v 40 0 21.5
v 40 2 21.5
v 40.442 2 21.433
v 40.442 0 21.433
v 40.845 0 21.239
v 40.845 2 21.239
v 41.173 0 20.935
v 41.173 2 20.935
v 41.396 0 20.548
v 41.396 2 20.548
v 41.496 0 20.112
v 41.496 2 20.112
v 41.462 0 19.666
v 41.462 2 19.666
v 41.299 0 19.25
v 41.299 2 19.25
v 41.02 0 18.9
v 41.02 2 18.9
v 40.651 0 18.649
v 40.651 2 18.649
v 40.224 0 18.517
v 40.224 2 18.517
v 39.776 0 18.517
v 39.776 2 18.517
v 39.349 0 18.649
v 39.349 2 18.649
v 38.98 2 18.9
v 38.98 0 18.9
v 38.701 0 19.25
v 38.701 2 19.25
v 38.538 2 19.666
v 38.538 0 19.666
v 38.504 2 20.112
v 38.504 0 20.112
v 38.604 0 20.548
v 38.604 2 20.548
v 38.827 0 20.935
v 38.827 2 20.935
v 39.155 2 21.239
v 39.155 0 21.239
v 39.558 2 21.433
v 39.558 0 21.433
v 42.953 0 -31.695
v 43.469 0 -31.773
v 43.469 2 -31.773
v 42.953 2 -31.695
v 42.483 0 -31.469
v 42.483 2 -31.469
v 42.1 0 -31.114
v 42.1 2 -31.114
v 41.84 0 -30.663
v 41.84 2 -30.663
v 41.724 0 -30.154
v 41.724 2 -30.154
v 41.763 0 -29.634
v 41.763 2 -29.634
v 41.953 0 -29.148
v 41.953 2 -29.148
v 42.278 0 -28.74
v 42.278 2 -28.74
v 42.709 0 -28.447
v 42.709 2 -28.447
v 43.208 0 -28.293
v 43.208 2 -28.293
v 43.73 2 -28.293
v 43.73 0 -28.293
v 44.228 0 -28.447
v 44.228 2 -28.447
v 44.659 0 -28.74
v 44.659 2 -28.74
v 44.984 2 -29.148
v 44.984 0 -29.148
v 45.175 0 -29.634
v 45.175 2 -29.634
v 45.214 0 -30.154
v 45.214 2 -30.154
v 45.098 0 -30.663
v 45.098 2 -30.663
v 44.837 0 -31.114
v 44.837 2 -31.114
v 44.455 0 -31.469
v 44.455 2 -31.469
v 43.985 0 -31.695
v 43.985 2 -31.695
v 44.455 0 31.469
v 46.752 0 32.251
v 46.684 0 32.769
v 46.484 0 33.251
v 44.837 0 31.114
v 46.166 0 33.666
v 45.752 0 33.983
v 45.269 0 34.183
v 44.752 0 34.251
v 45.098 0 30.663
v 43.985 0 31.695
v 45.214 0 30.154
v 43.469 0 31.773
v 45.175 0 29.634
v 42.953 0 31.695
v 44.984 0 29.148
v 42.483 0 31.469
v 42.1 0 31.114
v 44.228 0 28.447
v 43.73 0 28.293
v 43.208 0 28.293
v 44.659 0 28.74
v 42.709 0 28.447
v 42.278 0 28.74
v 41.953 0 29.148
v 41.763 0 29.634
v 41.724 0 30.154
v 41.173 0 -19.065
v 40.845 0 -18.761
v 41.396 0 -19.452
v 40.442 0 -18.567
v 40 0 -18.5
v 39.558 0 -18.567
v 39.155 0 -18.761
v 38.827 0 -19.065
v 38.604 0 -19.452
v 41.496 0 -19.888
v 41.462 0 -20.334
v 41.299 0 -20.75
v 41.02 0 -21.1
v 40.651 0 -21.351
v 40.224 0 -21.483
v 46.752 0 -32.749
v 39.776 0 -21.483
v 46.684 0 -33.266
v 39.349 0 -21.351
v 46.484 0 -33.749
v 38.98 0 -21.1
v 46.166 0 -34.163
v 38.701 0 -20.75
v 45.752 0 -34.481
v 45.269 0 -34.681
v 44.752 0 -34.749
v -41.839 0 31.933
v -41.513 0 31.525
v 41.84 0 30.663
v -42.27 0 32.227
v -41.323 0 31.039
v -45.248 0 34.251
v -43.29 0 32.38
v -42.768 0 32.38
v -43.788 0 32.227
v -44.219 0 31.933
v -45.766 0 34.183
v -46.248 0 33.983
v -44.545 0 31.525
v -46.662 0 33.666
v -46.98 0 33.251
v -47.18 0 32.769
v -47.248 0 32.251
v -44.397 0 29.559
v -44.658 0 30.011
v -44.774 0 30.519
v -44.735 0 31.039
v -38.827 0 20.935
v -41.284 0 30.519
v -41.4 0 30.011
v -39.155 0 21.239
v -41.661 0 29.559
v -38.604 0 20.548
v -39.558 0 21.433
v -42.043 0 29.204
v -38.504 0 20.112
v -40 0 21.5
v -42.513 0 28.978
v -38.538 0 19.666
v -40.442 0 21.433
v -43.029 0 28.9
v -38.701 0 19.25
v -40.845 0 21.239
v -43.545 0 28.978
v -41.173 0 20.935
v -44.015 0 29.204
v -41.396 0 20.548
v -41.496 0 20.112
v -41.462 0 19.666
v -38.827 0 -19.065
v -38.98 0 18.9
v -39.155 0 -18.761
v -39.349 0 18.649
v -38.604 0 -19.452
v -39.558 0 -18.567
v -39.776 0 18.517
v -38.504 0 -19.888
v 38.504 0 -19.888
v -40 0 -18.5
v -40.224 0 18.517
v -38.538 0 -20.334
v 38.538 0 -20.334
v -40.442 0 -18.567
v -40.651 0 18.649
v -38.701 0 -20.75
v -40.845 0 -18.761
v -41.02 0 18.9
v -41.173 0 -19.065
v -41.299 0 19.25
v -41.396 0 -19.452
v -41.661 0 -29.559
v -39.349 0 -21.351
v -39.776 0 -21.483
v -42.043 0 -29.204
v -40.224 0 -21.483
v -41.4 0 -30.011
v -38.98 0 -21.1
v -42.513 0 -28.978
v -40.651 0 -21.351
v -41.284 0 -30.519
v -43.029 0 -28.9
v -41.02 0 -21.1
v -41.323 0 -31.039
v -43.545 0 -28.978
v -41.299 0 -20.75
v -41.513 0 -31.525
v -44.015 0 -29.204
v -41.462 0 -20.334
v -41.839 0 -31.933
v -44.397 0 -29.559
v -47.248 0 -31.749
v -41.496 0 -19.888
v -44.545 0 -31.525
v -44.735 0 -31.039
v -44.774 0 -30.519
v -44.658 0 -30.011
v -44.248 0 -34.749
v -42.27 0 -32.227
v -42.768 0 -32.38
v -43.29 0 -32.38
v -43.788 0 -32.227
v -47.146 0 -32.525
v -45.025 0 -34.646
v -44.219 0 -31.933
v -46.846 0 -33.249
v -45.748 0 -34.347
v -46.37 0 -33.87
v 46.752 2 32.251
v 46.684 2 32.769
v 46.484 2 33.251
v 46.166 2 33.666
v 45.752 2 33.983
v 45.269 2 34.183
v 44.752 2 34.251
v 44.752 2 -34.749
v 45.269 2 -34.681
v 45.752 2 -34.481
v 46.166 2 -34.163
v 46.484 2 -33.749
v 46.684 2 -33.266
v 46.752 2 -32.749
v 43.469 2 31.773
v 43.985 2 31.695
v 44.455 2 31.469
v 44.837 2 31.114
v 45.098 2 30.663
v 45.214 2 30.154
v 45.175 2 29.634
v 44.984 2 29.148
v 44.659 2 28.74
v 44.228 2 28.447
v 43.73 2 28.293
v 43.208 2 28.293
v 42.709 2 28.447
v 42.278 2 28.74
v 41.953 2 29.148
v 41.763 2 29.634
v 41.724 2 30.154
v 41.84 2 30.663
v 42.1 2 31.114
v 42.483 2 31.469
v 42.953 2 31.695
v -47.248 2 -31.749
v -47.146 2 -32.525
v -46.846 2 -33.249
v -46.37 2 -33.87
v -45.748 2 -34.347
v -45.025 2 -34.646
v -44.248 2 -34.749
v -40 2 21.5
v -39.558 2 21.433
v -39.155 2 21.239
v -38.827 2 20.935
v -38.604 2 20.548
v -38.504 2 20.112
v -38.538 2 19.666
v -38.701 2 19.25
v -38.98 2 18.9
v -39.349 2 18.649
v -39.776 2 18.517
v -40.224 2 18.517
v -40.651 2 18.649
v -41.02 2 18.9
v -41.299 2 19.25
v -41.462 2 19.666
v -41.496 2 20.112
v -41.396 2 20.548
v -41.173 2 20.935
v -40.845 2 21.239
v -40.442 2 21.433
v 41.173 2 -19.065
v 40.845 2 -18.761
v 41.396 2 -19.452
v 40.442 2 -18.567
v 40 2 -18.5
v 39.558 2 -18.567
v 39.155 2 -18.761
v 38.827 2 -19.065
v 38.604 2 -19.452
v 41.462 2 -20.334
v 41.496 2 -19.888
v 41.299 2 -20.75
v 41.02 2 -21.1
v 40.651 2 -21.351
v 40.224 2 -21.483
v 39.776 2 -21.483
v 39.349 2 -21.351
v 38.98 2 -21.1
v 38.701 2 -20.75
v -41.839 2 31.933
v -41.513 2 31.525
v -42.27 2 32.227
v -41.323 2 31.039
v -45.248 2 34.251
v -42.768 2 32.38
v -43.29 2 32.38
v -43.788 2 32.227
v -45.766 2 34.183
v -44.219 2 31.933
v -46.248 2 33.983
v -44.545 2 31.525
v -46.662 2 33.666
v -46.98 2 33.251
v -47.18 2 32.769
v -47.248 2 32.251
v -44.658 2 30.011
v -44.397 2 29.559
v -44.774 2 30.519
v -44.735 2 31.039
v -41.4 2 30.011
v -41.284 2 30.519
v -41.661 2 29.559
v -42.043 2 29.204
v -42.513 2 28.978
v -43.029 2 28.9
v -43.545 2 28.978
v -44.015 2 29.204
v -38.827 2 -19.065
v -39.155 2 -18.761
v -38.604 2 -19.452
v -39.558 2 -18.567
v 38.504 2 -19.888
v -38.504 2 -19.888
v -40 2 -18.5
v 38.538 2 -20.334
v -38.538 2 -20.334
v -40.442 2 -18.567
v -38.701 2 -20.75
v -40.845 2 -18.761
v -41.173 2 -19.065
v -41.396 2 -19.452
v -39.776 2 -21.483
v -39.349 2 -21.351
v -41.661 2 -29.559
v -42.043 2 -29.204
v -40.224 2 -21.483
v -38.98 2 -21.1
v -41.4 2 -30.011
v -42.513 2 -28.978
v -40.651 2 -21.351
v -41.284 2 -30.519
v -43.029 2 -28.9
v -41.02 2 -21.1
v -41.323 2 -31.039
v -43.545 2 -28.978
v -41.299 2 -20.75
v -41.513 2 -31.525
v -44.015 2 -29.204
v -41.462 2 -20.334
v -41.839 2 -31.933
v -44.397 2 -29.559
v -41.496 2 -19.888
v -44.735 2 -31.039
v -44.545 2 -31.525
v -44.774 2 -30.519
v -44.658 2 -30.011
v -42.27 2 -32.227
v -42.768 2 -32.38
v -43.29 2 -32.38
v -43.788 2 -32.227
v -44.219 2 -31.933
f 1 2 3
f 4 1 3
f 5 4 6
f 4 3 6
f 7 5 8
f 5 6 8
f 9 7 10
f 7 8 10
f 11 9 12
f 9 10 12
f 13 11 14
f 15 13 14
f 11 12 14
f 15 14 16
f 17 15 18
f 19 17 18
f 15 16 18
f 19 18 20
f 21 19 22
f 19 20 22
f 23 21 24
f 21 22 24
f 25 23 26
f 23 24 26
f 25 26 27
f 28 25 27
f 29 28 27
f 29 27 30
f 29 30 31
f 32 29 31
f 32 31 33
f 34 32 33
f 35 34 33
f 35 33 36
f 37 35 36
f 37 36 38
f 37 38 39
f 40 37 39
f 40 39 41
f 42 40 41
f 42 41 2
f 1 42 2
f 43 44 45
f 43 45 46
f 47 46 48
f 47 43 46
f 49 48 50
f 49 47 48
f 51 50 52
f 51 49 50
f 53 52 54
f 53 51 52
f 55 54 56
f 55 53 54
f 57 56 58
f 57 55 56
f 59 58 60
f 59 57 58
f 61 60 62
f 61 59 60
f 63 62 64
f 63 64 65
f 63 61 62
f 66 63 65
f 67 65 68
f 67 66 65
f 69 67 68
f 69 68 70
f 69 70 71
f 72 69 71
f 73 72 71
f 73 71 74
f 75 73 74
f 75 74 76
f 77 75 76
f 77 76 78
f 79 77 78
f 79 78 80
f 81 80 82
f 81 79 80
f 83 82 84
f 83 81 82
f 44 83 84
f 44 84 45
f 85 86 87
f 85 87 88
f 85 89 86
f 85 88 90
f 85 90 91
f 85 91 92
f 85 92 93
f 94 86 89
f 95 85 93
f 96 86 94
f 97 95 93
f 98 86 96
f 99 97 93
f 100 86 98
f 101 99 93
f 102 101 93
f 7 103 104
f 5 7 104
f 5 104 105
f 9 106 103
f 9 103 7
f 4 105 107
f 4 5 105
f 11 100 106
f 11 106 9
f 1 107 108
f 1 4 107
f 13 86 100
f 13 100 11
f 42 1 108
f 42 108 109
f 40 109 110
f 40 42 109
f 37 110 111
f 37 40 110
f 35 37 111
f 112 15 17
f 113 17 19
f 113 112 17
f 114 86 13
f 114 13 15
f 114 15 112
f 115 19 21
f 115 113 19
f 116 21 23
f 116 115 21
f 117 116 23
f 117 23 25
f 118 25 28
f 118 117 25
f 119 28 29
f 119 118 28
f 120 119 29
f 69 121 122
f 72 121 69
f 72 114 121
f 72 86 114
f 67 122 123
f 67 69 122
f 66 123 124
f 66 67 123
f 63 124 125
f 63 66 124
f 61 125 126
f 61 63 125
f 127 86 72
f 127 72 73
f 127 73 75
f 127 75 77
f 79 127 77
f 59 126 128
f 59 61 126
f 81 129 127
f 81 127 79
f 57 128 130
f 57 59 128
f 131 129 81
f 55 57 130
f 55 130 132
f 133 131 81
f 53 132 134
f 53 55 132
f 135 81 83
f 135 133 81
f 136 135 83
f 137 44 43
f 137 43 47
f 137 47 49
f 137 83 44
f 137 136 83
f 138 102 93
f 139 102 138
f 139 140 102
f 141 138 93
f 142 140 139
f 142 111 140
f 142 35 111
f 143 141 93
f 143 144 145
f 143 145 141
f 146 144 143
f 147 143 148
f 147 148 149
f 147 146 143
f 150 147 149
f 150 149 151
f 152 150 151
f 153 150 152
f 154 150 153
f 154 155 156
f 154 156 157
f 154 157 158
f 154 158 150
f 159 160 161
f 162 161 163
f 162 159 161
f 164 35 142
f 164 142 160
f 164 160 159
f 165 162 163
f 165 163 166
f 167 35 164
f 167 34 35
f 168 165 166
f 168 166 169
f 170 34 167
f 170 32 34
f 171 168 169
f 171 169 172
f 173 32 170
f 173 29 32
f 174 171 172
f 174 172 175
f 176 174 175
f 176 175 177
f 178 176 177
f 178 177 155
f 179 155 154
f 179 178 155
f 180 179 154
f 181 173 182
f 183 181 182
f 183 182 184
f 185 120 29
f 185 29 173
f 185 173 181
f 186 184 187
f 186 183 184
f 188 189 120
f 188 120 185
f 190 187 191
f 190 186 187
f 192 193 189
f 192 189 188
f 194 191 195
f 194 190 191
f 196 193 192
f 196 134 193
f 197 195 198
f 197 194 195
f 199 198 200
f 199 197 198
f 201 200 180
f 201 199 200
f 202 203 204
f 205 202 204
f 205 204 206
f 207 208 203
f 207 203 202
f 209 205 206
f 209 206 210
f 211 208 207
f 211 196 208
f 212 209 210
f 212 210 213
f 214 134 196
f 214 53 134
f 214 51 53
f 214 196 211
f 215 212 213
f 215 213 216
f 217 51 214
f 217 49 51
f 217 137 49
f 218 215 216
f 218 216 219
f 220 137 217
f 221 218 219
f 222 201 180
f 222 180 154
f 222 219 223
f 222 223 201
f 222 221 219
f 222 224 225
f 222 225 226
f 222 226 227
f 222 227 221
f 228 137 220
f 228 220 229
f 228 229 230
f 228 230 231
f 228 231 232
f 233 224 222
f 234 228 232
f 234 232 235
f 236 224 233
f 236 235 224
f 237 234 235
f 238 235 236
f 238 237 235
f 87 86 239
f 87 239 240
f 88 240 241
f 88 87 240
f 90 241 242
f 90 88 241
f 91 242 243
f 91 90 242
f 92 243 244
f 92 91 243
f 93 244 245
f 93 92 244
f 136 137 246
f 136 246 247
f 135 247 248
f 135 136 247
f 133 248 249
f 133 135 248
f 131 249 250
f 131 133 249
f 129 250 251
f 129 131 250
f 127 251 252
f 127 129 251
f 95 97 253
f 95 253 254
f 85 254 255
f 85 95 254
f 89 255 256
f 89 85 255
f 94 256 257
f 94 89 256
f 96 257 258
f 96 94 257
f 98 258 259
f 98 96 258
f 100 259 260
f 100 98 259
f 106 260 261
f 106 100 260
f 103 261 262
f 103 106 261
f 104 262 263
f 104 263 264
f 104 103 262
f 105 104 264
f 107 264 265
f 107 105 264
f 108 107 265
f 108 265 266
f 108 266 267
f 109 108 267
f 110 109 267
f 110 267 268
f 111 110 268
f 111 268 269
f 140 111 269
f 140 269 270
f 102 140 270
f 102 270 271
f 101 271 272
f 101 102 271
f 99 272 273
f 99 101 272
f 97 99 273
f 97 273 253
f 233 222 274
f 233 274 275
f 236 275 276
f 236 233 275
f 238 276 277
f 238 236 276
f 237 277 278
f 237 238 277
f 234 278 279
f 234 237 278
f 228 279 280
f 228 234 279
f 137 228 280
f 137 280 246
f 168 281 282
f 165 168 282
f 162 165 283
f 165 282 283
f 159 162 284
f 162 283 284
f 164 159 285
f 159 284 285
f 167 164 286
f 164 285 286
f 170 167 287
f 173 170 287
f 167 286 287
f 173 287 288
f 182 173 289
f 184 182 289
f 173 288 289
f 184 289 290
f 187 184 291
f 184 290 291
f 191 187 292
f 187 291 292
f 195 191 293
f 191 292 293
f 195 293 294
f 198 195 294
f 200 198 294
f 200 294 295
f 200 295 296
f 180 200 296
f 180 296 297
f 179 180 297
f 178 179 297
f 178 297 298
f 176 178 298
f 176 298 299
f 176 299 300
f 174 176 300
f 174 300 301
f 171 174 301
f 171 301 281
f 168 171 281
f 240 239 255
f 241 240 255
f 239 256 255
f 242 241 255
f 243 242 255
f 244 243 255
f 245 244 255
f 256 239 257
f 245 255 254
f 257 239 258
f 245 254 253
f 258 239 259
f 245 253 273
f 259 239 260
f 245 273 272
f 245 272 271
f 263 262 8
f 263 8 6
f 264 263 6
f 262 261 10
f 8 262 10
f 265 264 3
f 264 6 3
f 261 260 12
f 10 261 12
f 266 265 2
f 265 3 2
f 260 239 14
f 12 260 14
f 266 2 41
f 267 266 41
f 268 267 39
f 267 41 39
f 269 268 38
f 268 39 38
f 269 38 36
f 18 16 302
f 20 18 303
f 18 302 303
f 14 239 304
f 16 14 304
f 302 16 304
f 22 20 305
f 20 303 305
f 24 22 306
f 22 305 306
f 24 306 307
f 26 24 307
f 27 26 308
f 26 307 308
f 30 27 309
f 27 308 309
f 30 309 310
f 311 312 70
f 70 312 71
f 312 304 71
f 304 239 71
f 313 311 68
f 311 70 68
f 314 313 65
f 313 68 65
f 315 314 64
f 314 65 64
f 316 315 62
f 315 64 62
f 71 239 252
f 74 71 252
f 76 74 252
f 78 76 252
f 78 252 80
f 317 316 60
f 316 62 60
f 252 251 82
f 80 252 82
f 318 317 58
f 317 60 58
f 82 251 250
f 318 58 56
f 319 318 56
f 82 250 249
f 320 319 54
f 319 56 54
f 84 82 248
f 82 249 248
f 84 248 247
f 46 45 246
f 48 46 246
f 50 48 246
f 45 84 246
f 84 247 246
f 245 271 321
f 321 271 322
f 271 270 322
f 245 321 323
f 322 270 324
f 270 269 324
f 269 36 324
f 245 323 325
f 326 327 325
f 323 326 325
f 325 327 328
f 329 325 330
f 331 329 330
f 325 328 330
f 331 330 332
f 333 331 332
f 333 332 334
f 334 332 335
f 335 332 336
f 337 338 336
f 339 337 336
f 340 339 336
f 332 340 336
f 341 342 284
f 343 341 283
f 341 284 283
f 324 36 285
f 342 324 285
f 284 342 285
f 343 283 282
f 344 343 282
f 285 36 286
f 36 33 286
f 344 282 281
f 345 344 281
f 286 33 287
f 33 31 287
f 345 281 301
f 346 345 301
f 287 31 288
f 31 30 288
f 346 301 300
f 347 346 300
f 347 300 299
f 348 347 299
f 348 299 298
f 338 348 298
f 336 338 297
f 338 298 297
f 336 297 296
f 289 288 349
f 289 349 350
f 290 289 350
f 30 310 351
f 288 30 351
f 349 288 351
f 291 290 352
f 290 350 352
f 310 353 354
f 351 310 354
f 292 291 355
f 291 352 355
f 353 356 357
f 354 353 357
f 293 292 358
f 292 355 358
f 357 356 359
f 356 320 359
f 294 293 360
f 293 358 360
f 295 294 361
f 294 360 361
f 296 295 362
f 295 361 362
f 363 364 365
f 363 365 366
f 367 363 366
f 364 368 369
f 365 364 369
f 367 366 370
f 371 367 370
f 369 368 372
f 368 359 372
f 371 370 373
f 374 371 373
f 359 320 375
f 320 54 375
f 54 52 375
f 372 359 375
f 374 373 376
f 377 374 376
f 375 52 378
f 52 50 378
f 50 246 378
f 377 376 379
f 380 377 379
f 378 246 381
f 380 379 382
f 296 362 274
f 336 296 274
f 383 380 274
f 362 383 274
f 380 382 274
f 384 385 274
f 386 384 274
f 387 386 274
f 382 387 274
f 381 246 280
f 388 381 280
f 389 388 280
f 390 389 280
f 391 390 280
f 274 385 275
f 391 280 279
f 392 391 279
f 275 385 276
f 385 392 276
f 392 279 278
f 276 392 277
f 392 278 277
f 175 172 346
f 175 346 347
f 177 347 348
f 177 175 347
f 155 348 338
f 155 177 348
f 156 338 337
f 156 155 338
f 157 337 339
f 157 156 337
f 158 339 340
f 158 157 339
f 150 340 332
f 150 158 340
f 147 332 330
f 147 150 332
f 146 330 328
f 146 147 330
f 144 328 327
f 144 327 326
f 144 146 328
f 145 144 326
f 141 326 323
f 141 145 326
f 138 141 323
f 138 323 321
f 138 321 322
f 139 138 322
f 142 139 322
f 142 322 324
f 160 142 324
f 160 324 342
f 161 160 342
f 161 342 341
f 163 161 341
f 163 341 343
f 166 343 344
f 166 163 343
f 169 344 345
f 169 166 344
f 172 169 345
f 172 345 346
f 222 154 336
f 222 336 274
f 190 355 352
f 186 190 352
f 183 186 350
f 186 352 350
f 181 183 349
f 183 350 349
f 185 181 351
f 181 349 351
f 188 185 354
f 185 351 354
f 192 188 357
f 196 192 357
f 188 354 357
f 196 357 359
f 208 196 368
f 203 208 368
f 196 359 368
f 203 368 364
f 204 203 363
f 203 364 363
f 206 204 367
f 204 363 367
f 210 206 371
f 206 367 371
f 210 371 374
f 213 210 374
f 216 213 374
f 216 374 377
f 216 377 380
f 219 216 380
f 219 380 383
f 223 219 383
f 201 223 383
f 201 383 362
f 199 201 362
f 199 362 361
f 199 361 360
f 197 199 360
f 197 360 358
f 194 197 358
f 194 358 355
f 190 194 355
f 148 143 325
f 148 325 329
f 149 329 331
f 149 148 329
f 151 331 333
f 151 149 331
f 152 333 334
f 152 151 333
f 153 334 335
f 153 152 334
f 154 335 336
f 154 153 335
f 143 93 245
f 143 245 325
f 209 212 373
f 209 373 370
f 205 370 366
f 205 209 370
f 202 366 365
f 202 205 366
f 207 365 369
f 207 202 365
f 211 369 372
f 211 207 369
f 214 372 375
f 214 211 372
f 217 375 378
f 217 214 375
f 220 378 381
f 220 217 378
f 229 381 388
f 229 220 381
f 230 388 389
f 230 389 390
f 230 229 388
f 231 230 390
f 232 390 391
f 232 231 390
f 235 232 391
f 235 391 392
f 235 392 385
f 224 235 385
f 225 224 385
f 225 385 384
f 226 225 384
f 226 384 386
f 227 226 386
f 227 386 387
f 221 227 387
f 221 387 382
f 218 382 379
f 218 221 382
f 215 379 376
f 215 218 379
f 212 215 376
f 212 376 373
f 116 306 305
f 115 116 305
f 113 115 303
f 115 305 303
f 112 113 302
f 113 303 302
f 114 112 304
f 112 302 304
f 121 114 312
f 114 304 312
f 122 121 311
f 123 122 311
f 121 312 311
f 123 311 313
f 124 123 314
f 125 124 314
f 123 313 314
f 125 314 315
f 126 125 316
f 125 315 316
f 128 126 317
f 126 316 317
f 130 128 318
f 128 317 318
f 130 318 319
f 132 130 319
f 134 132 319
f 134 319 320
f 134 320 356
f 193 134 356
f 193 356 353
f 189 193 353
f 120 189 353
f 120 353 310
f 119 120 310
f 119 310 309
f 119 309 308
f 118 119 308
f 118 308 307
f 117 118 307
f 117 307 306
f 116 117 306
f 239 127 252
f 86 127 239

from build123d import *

# Parameters (mm, degrees)
SKETCH_1_R          = 1.75
EXTRUDE_1_DEPTH     = 2
SKETCH_3_R          = 1.5
CUT_EXTRUDE_1_DEPTH = 10


with BuildPart() as part:
    # 草图1 → 凸台-拉伸1 (new body)
    with BuildSketch(Plane(origin=(0, 0, 0), x_dir=(1, 0, 0), z_dir=(0, 1, 0))):
        with BuildLine():
            Line((-44.248197972, 34.748679798), (44.751802028, 34.748679798))
            ThreePointArc((44.751802028, 34.748679798), (46.16601559, 34.16289336), (46.751802028, 32.748679798))
            Line((46.751802028, 32.748679798), (46.751802028, -32.251320202))
            ThreePointArc((46.751802028, -32.251320202), (46.16601559, -33.665533764), (44.751802028, -34.251320202))
            Line((44.751802028, -34.251320202), (-45.248197972, -34.251320202))
            ThreePointArc((-45.248197972, -34.251320202), (-46.662411535, -33.665533764), (-47.248197972, -32.251320202))
            Line((-47.248197972, -32.251320202), (-47.248197972, 31.748679798))
            ThreePointArc((-47.248197972, 31.748679798), (-46.369518316, 33.870000142), (-44.248197972, 34.748679798))
        make_face()
        with Locations(Location((-43.029034064, 30.65, 0), (0, 0, 270))):
            Circle(SKETCH_1_R, mode=Mode.SUBTRACT)
        with Locations(Location((43.468694969, 30.023204862, 0), (0, 0, 90))):
            Circle(SKETCH_1_R, mode=Mode.SUBTRACT)
        with Locations(Location((43.468694969, -30.023204862, 0), (0, 0, 270))):
            Circle(SKETCH_1_R, mode=Mode.SUBTRACT)
        with Locations(Location((-43.029034064, -30.65, 0), (0, 0, 90))):
            Circle(SKETCH_1_R, mode=Mode.SUBTRACT)
    extrude(amount=EXTRUDE_1_DEPTH)

    # 草图3 → 切除-拉伸1 (cut)
    with BuildSketch(Plane(origin=(0, 2, 0), x_dir=(1, 0, 0), z_dir=(0, 1, 0))):
        with Locations(Location((-40, -20, 0), (0, 0, 270))):
            Circle(SKETCH_3_R)
        with Locations(Location((40, -20, 0), (0, 0, 270))):
            Circle(SKETCH_3_R)
        with Locations(Location((40, 20, 0), (0, 0, 270))):
            Circle(SKETCH_3_R)
        with Locations(Location((-40, 20, 0), (0, 0, 270))):
            Circle(SKETCH_3_R)
    extrude(amount=-CUT_EXTRUDE_1_DEPTH, mode=Mode.SUBTRACT)


solid = part.part
